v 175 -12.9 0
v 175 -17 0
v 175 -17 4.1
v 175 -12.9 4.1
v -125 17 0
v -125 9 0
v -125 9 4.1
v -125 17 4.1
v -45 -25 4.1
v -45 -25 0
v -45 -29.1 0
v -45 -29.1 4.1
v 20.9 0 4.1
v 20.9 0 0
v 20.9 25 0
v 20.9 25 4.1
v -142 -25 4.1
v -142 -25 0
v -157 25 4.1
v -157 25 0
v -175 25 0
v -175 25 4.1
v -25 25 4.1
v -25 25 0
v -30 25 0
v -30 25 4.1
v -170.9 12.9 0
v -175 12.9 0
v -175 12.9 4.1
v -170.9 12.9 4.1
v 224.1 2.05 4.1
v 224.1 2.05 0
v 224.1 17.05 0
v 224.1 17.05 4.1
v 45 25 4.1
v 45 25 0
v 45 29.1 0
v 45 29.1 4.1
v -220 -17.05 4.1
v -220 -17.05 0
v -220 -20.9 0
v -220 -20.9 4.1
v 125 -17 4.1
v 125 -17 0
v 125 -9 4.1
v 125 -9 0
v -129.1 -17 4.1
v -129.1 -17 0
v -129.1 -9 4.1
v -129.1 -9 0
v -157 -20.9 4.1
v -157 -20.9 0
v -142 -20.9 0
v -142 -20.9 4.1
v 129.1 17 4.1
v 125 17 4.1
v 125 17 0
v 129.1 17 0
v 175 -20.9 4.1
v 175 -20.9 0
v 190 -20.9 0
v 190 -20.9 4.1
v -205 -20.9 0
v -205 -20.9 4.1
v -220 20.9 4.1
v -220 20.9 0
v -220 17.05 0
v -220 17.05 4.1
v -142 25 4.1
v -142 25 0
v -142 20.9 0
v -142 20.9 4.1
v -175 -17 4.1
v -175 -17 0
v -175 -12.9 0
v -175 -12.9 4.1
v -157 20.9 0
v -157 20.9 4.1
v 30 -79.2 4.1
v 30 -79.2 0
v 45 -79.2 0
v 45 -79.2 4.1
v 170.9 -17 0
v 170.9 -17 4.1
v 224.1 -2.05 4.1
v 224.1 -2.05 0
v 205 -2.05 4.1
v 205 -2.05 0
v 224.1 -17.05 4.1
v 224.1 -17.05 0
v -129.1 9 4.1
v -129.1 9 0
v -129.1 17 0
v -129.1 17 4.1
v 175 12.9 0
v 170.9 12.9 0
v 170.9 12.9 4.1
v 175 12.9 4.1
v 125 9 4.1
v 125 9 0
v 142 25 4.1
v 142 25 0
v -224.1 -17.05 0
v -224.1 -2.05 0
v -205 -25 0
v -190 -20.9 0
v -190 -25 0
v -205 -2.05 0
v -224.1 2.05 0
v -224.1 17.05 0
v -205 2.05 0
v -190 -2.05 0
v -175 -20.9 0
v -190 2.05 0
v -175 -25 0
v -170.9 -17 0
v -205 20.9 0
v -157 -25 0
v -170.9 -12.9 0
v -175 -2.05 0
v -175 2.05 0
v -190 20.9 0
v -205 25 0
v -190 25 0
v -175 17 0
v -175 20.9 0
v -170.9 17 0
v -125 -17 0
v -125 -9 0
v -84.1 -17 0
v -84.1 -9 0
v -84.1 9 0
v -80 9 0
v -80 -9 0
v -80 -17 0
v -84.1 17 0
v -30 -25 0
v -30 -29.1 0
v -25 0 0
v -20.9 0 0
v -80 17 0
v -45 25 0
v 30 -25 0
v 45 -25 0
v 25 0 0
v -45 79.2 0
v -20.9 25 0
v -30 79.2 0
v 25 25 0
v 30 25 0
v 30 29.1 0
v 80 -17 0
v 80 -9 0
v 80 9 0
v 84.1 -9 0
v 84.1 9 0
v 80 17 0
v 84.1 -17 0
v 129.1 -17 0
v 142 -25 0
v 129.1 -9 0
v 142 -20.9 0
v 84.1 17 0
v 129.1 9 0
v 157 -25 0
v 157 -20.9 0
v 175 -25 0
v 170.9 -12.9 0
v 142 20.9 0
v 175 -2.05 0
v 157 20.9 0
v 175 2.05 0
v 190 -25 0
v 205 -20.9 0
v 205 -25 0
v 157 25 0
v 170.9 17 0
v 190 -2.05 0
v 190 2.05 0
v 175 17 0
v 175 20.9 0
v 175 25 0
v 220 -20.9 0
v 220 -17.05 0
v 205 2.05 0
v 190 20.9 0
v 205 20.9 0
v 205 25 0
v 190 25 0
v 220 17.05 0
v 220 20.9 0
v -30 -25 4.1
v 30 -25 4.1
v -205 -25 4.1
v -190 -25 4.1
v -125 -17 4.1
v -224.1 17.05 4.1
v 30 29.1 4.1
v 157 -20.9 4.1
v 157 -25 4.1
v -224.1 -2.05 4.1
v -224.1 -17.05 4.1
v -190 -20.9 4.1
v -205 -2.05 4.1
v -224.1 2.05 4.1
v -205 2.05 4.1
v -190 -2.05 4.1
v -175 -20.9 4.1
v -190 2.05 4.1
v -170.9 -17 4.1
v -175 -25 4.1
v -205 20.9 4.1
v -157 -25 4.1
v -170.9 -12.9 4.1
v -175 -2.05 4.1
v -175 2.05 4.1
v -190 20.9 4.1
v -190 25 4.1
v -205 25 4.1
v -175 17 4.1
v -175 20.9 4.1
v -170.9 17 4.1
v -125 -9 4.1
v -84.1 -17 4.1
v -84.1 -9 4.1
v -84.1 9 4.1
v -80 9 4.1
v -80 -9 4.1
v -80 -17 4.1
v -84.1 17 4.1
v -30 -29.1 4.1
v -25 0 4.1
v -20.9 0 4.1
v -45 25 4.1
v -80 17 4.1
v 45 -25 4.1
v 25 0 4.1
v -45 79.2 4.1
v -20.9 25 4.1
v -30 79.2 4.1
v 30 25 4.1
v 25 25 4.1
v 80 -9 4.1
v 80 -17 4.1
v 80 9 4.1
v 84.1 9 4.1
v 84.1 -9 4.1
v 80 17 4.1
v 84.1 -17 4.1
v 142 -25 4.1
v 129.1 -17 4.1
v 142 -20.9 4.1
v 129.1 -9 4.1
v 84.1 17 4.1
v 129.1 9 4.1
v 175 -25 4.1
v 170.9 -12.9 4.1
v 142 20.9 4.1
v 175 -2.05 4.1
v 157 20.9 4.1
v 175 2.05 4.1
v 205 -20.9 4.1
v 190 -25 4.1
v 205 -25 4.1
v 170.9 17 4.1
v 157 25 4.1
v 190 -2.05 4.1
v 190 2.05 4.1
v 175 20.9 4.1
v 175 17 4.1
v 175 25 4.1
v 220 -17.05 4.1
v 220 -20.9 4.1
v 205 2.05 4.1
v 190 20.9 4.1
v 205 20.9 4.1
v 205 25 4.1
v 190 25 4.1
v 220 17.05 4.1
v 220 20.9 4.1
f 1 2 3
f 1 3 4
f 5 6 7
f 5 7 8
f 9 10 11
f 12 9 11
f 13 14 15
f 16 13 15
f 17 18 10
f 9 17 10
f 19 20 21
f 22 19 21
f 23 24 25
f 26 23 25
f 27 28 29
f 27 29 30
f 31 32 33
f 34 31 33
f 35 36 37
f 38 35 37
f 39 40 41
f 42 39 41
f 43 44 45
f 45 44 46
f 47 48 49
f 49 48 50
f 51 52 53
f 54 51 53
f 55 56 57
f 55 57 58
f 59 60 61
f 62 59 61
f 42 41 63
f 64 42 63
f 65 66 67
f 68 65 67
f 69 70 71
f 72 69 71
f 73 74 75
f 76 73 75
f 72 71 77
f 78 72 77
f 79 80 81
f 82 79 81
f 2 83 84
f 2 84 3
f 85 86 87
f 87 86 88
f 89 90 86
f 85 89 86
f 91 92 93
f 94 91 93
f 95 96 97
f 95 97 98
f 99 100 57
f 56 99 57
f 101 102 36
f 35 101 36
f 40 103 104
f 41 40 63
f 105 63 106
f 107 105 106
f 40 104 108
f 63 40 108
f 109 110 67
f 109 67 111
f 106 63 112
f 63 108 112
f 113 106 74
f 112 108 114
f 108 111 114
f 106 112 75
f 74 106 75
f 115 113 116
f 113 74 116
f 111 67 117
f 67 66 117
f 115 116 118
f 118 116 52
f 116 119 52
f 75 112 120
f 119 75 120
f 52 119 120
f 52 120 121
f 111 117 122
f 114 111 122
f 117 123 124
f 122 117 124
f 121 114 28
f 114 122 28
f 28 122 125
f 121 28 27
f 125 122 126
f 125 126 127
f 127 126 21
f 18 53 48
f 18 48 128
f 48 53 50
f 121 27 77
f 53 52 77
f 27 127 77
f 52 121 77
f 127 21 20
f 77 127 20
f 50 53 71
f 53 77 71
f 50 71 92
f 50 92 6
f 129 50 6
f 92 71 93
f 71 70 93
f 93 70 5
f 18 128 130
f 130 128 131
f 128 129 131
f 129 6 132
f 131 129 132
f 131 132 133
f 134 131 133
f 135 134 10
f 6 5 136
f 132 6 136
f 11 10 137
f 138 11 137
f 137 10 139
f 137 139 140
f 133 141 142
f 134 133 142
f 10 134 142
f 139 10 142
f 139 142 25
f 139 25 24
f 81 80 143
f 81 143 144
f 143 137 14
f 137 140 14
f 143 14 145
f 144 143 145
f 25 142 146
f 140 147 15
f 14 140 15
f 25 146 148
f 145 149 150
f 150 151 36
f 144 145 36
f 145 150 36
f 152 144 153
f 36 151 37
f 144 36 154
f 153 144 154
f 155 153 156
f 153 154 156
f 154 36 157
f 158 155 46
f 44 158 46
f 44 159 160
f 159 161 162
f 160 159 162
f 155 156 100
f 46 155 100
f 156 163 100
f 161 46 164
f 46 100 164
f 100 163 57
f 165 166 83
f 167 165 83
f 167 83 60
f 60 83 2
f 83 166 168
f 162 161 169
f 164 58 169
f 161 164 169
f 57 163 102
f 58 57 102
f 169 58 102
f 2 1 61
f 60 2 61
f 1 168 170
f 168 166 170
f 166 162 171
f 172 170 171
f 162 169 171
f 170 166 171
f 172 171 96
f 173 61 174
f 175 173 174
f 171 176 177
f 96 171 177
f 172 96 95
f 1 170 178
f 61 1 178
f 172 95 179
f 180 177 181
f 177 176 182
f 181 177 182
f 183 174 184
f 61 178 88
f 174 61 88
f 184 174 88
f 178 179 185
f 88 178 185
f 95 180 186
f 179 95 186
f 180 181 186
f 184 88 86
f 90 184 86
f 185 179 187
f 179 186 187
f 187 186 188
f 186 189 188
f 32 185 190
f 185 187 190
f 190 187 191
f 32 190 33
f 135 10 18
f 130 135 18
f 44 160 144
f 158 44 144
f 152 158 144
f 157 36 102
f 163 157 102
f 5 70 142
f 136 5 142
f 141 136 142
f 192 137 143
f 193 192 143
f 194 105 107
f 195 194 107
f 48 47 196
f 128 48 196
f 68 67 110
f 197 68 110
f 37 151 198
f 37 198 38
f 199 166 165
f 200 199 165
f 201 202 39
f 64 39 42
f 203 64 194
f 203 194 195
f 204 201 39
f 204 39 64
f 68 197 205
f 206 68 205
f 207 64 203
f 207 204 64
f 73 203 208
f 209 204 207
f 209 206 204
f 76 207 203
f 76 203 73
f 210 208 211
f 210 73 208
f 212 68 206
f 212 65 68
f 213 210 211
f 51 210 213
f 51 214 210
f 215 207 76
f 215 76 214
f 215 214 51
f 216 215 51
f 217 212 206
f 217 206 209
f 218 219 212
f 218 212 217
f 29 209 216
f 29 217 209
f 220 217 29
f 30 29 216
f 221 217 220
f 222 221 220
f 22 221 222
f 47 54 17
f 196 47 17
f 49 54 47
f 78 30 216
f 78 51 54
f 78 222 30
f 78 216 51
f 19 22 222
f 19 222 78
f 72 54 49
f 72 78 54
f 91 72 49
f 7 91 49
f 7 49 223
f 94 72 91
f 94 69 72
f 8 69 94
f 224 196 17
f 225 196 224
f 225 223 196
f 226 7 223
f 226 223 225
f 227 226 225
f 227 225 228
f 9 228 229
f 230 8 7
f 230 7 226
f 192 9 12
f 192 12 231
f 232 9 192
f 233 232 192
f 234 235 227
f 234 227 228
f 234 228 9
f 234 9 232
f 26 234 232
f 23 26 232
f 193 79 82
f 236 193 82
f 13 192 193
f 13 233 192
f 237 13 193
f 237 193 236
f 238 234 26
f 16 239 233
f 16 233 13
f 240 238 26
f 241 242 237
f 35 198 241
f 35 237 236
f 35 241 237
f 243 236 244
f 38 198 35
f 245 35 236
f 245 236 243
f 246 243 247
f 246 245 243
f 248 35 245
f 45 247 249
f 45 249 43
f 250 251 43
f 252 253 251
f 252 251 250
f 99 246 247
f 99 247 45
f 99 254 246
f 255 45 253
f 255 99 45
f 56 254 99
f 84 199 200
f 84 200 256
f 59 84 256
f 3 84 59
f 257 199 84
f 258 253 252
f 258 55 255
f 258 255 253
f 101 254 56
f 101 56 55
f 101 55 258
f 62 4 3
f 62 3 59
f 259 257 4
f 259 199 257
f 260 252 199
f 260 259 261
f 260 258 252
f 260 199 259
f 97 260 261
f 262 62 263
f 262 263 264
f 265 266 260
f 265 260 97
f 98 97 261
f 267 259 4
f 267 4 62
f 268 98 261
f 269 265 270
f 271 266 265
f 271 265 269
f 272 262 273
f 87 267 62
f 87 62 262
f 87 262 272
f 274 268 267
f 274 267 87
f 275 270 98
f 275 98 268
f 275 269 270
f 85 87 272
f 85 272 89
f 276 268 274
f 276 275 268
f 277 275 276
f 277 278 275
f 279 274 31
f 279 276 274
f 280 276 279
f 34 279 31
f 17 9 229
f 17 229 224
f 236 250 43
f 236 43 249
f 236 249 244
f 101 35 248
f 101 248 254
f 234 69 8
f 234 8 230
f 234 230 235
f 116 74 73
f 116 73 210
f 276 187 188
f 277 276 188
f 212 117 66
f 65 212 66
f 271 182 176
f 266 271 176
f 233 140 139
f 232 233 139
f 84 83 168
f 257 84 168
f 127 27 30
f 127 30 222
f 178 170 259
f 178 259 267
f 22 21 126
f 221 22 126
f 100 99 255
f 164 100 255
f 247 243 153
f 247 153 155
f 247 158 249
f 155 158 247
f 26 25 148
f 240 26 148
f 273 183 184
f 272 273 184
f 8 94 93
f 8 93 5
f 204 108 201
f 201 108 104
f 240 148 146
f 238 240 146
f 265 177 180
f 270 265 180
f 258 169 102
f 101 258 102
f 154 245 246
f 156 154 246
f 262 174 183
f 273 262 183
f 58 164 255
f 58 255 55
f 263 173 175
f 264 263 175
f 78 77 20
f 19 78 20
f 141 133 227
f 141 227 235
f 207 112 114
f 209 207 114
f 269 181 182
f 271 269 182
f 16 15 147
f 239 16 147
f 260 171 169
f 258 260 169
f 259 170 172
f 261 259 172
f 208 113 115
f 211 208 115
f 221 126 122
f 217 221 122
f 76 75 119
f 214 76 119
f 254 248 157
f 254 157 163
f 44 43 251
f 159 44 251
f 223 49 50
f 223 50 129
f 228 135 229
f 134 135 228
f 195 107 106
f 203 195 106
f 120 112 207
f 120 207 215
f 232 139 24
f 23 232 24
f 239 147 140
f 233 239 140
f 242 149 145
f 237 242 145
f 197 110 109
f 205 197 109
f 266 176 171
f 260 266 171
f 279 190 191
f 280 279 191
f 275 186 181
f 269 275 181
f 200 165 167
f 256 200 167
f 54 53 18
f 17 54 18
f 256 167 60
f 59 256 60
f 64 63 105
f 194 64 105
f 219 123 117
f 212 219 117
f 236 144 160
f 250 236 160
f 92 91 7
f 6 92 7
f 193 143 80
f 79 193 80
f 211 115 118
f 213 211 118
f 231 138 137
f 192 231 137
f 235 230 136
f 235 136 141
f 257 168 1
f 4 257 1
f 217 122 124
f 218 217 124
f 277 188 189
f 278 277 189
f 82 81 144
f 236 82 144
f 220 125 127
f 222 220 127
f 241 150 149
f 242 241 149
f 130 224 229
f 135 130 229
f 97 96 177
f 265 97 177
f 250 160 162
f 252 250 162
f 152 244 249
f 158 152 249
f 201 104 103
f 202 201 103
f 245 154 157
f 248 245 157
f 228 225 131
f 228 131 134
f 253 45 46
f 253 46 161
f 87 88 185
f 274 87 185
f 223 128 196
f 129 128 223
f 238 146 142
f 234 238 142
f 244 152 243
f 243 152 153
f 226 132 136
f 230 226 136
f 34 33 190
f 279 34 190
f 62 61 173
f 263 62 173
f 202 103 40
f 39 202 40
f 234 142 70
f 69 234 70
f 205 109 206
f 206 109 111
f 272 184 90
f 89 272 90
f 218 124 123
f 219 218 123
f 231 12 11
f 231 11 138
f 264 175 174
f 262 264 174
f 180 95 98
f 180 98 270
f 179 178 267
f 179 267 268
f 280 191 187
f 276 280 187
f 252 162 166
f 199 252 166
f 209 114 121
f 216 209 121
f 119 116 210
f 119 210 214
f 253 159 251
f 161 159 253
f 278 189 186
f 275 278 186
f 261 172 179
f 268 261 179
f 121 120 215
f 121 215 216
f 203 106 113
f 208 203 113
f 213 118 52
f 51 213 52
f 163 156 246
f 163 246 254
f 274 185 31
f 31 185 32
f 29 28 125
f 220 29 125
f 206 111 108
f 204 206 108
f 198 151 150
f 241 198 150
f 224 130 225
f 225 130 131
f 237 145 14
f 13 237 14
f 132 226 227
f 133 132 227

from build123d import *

# Parameters (mm, degrees)
SKETCH1_W           = 4.1
SKETCH1_H           = 4.1
SKETCH1_H_2         = 8
SKETCH1_W_2         = 15
BOSS_EXTRUDE1_DEPTH = 4.1
SKETCH2_W           = 15
SKETCH2_H           = 4.1
TOP_RIGHT_DEPTH     = 50.1
SKETCH3_W           = 15
SKETCH3_H           = 4.1
BOTTOM_LEFT_DEPTH   = 50.1


with BuildPart() as part:
    # Sketch1 → Boss-Extrude1 (new body)
    with BuildSketch(Plane.XY):
        Polygon((-205, -20.9), (-205, -25), (-190, -25), (-190, -20.9), (-175, -20.9), (-175, -25), (-157, -25), (-157, -20.9), (-142, -20.9), (-142, -25), (-45, -25), (-45, -79.2), (-30, -79.2), (-30, -25), (30, -25), (30, -79.2), (45, -79.2), (45, -25), (142, -25), (142, -20.9), (157, -20.9), (157, -25), (175, -25), (175, -20.9), (190, -20.9), (190, -25), (205, -25), (205, -20.9), (220, -20.9), (220, -17.05), (224.1, -17.05), (224.1, -2.05), (205, -2.05), (205, 2.05), (224.1, 2.05), (224.1, 17.05), (220, 17.05), (220, 20.9), (205, 20.9), (205, 25), (190, 25), (190, 20.9), (175, 20.9), (175, 25), (157, 25), (157, 20.9), (142, 20.9), (142, 25), (45, 25), (45, 79.2), (30, 79.2), (30, 25), (25, 25), (25, 0), (20.9, 0), (20.9, 25), (-20.9, 25), (-20.9, 0), (-25, 0), (-25, 25), (-30, 25), (-30, 79.2), (-45, 79.2), (-45, 25), (-142, 25), (-142, 20.9), (-157, 20.9), (-157, 25), (-175, 25), (-175, 20.9), (-190, 20.9), (-190, 25), (-205, 25), (-205, 20.9), (-220, 20.9), (-220, 17.05), (-224.1, 17.05), (-224.1, 2.05), (-205, 2.05), (-205, -2.05), (-224.1, -2.05), (-224.1, -17.05), (-220, -17.05), (-220, -20.9), align=None)
        with Locations((-172.95, -14.95)):
            Rectangle(SKETCH1_W, SKETCH1_H, mode=Mode.SUBTRACT)
        with Locations((-127.05, -13)):
            Rectangle(SKETCH1_W, SKETCH1_H_2, mode=Mode.SUBTRACT)
        with Locations((-82.05, -13)):
            Rectangle(SKETCH1_W, SKETCH1_H_2, mode=Mode.SUBTRACT)
        with Locations((82.05, -13)):
            Rectangle(SKETCH1_W, SKETCH1_H_2, mode=Mode.SUBTRACT)
        with Locations((127.05, -13)):
            Rectangle(SKETCH1_W, SKETCH1_H_2, mode=Mode.SUBTRACT)
        with Locations((172.95, -14.95)):
            Rectangle(SKETCH1_W, SKETCH1_H, mode=Mode.SUBTRACT)
        with Locations((-182.5, 0)):
            Rectangle(SKETCH1_W_2, SKETCH1_H, mode=Mode.SUBTRACT)
        with Locations((-172.95, 14.95)):
            Rectangle(SKETCH1_W, SKETCH1_H, mode=Mode.SUBTRACT)
        with Locations((-127.05, 13)):
            Rectangle(SKETCH1_W, SKETCH1_H_2, mode=Mode.SUBTRACT)
        with Locations((-82.05, 13)):
            Rectangle(SKETCH1_W, SKETCH1_H_2, mode=Mode.SUBTRACT)
        with Locations((82.05, 13)):
            Rectangle(SKETCH1_W, SKETCH1_H_2, mode=Mode.SUBTRACT)
        with Locations((127.05, 13)):
            Rectangle(SKETCH1_W, SKETCH1_H_2, mode=Mode.SUBTRACT)
        with Locations((182.5, 0)):
            Rectangle(SKETCH1_W_2, SKETCH1_H, mode=Mode.SUBTRACT)
        with Locations((172.95, 14.95)):
            Rectangle(SKETCH1_W, SKETCH1_H, mode=Mode.SUBTRACT)
    extrude(amount=BOSS_EXTRUDE1_DEPTH)

    # Sketch2 → top right (cut)
    with BuildSketch(Plane(origin=(0, 79.2, 0), x_dir=(1, 0, 0), z_dir=(0, 1, 0))):
        with Locations((37.5, -2.05)):
            Rectangle(SKETCH2_W, SKETCH2_H)
    extrude(amount=-TOP_RIGHT_DEPTH, mode=Mode.SUBTRACT)

    # Sketch3 → bottom left (cut)
    with BuildSketch(Plane.XZ.offset(79.2)):
        with Locations((-37.5, 2.05)):
            Rectangle(SKETCH3_W, SKETCH3_H)
    extrude(amount=-BOTTOM_LEFT_DEPTH, mode=Mode.SUBTRACT)


solid = part.part
